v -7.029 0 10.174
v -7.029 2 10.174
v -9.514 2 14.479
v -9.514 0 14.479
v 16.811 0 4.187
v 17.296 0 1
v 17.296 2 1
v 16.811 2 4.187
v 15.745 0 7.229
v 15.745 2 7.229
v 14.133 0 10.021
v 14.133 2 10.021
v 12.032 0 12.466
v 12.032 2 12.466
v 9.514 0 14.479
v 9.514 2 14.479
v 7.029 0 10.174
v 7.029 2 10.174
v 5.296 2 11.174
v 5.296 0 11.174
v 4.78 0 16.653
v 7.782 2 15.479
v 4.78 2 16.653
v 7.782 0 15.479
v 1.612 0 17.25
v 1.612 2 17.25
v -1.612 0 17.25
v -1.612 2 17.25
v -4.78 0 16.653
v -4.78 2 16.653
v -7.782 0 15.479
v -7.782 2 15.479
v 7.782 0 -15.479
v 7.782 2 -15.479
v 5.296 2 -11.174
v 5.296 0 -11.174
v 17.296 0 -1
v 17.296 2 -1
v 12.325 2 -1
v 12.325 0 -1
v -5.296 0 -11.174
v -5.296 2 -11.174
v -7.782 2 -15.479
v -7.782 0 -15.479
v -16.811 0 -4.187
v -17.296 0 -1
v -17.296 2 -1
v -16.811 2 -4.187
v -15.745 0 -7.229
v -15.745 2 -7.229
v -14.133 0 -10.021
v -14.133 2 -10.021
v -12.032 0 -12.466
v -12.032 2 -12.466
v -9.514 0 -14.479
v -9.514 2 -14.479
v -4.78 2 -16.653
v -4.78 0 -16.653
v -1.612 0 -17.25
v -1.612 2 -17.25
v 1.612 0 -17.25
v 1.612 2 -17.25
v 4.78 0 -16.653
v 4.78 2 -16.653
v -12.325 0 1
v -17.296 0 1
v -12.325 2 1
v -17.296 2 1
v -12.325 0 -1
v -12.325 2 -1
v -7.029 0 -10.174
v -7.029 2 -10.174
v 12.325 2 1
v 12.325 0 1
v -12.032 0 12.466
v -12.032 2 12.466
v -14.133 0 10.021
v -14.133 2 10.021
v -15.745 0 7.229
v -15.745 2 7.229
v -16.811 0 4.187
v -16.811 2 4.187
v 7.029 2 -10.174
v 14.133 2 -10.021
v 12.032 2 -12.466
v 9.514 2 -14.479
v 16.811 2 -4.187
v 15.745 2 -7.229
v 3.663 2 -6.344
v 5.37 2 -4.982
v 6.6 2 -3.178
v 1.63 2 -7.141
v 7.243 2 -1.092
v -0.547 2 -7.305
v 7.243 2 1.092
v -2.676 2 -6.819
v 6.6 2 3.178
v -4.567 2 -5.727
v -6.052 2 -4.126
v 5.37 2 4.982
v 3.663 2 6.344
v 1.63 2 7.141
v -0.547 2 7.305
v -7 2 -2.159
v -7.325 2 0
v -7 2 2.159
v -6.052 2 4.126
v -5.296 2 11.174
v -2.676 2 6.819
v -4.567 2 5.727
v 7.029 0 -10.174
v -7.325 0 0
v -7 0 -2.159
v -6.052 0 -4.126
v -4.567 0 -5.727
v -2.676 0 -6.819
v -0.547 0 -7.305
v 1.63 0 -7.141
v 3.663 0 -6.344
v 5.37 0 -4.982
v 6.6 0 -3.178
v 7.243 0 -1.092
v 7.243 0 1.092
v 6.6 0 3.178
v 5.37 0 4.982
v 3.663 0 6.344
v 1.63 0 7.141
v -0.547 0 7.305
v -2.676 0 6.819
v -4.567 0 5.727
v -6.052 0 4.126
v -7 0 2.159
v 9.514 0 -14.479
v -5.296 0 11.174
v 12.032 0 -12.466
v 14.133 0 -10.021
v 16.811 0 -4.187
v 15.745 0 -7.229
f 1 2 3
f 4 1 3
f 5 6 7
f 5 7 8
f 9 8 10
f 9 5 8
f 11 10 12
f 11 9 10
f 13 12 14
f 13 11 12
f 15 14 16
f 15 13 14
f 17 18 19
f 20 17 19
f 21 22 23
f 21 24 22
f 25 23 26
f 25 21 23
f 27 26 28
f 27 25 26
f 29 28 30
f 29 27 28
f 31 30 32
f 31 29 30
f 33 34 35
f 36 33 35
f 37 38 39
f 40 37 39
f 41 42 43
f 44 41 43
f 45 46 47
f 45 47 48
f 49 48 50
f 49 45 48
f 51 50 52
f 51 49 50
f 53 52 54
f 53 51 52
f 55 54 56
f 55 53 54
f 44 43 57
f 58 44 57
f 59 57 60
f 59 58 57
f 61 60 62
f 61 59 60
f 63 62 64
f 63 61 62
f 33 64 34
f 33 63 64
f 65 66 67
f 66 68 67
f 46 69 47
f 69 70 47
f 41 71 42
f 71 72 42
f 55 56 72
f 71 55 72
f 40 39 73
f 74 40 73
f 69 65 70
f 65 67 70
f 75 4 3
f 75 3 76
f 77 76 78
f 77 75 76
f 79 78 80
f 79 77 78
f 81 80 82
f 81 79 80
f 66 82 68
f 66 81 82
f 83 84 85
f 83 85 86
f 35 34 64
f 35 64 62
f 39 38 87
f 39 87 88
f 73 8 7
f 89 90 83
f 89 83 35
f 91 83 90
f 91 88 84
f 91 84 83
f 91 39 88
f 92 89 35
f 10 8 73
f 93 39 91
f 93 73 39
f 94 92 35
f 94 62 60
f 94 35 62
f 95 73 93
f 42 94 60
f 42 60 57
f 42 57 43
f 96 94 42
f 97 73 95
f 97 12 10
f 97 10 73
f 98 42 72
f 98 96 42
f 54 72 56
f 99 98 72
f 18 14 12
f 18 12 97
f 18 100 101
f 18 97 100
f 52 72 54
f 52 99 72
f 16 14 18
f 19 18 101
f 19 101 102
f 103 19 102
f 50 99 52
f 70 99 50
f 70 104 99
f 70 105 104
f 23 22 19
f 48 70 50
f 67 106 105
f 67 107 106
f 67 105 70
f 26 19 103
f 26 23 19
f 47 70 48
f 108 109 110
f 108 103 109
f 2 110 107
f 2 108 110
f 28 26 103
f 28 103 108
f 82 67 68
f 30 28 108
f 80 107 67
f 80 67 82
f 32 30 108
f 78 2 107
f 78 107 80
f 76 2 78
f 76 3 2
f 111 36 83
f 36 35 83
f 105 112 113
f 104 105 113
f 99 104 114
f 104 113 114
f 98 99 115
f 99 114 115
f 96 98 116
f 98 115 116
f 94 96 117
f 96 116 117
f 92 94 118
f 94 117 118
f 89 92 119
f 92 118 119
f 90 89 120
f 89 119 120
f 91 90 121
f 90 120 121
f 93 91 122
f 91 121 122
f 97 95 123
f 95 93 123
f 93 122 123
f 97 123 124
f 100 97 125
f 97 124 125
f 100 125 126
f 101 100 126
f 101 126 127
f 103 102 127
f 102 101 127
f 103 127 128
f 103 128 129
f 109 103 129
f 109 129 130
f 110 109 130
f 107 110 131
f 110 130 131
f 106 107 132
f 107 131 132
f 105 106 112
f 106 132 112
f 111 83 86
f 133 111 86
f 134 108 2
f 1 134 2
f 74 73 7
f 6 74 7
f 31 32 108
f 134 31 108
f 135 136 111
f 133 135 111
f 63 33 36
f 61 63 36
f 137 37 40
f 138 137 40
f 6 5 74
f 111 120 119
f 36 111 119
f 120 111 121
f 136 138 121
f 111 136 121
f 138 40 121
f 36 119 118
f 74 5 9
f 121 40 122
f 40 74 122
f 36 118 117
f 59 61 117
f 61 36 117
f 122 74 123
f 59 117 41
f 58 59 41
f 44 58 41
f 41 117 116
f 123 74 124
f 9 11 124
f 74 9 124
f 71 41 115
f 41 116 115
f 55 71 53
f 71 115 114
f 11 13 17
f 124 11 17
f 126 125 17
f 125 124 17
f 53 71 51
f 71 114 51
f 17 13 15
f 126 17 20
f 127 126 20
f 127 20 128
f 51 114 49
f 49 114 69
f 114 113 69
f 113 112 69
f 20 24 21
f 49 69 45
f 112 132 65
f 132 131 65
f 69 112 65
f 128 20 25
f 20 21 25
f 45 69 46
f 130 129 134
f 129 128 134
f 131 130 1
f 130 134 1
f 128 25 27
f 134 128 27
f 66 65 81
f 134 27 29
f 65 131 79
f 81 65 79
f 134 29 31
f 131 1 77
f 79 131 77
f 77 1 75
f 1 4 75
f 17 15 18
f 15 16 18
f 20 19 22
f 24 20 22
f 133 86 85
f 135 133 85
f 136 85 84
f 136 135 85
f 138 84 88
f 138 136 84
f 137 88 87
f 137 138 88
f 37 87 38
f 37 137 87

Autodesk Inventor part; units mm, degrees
ref_plane "YZ Plane" through (0, 0, 0) normal (1, 0, 0) x (0, 1, 0)
ref_plane "XZ Plane" through (0, 0, 0) normal (0, 1, 0) x (-1, 0, 0)
ref_plane "XY Plane" through (0, 0, 0) normal (0, 0, 1) x (1, 0, 0)
sketch "Sketch1" plane through (0, 0, 0) normal (0, 1, 0) x (-1, 0, 0)
  circle A0 centre (0, 0) radius 17.325
  circle A1 centre (0, 0) radius 7.325
  dimension "d0" = 34.65
  dimension "d1" = 14.65
extrude "Extrusion1" add sketch "Sketch1" along normal blind 2
sketch "Sketch2" plane through (0, 2, 0) normal (0, 1, 0) x (1, 0, 0)
  line L0 (-22.325, -1) -> (-12.325, -1)
  line L1 (-12.325, -1) -> (-12.325, 1)
  line L2 (-12.325, 1) -> (-22.325, 1)
  line L3 (-22.325, 1) -> (-22.325, -1)
  point P0 (0, 0)
  dimension "d4" = 1
  dimension "d5" = 2
  dimension "d6" = 12.325
  dimension "d7" = 10
extrude "Extrusion2" cut sketch "Sketch2" against normal blind 2
pattern_circular "Circular Pattern2" count 6 over 360 about axis through (0, -10, 0) along (0, 1, 0) of "Extrusion2"
properties part number "Ring_n7"
